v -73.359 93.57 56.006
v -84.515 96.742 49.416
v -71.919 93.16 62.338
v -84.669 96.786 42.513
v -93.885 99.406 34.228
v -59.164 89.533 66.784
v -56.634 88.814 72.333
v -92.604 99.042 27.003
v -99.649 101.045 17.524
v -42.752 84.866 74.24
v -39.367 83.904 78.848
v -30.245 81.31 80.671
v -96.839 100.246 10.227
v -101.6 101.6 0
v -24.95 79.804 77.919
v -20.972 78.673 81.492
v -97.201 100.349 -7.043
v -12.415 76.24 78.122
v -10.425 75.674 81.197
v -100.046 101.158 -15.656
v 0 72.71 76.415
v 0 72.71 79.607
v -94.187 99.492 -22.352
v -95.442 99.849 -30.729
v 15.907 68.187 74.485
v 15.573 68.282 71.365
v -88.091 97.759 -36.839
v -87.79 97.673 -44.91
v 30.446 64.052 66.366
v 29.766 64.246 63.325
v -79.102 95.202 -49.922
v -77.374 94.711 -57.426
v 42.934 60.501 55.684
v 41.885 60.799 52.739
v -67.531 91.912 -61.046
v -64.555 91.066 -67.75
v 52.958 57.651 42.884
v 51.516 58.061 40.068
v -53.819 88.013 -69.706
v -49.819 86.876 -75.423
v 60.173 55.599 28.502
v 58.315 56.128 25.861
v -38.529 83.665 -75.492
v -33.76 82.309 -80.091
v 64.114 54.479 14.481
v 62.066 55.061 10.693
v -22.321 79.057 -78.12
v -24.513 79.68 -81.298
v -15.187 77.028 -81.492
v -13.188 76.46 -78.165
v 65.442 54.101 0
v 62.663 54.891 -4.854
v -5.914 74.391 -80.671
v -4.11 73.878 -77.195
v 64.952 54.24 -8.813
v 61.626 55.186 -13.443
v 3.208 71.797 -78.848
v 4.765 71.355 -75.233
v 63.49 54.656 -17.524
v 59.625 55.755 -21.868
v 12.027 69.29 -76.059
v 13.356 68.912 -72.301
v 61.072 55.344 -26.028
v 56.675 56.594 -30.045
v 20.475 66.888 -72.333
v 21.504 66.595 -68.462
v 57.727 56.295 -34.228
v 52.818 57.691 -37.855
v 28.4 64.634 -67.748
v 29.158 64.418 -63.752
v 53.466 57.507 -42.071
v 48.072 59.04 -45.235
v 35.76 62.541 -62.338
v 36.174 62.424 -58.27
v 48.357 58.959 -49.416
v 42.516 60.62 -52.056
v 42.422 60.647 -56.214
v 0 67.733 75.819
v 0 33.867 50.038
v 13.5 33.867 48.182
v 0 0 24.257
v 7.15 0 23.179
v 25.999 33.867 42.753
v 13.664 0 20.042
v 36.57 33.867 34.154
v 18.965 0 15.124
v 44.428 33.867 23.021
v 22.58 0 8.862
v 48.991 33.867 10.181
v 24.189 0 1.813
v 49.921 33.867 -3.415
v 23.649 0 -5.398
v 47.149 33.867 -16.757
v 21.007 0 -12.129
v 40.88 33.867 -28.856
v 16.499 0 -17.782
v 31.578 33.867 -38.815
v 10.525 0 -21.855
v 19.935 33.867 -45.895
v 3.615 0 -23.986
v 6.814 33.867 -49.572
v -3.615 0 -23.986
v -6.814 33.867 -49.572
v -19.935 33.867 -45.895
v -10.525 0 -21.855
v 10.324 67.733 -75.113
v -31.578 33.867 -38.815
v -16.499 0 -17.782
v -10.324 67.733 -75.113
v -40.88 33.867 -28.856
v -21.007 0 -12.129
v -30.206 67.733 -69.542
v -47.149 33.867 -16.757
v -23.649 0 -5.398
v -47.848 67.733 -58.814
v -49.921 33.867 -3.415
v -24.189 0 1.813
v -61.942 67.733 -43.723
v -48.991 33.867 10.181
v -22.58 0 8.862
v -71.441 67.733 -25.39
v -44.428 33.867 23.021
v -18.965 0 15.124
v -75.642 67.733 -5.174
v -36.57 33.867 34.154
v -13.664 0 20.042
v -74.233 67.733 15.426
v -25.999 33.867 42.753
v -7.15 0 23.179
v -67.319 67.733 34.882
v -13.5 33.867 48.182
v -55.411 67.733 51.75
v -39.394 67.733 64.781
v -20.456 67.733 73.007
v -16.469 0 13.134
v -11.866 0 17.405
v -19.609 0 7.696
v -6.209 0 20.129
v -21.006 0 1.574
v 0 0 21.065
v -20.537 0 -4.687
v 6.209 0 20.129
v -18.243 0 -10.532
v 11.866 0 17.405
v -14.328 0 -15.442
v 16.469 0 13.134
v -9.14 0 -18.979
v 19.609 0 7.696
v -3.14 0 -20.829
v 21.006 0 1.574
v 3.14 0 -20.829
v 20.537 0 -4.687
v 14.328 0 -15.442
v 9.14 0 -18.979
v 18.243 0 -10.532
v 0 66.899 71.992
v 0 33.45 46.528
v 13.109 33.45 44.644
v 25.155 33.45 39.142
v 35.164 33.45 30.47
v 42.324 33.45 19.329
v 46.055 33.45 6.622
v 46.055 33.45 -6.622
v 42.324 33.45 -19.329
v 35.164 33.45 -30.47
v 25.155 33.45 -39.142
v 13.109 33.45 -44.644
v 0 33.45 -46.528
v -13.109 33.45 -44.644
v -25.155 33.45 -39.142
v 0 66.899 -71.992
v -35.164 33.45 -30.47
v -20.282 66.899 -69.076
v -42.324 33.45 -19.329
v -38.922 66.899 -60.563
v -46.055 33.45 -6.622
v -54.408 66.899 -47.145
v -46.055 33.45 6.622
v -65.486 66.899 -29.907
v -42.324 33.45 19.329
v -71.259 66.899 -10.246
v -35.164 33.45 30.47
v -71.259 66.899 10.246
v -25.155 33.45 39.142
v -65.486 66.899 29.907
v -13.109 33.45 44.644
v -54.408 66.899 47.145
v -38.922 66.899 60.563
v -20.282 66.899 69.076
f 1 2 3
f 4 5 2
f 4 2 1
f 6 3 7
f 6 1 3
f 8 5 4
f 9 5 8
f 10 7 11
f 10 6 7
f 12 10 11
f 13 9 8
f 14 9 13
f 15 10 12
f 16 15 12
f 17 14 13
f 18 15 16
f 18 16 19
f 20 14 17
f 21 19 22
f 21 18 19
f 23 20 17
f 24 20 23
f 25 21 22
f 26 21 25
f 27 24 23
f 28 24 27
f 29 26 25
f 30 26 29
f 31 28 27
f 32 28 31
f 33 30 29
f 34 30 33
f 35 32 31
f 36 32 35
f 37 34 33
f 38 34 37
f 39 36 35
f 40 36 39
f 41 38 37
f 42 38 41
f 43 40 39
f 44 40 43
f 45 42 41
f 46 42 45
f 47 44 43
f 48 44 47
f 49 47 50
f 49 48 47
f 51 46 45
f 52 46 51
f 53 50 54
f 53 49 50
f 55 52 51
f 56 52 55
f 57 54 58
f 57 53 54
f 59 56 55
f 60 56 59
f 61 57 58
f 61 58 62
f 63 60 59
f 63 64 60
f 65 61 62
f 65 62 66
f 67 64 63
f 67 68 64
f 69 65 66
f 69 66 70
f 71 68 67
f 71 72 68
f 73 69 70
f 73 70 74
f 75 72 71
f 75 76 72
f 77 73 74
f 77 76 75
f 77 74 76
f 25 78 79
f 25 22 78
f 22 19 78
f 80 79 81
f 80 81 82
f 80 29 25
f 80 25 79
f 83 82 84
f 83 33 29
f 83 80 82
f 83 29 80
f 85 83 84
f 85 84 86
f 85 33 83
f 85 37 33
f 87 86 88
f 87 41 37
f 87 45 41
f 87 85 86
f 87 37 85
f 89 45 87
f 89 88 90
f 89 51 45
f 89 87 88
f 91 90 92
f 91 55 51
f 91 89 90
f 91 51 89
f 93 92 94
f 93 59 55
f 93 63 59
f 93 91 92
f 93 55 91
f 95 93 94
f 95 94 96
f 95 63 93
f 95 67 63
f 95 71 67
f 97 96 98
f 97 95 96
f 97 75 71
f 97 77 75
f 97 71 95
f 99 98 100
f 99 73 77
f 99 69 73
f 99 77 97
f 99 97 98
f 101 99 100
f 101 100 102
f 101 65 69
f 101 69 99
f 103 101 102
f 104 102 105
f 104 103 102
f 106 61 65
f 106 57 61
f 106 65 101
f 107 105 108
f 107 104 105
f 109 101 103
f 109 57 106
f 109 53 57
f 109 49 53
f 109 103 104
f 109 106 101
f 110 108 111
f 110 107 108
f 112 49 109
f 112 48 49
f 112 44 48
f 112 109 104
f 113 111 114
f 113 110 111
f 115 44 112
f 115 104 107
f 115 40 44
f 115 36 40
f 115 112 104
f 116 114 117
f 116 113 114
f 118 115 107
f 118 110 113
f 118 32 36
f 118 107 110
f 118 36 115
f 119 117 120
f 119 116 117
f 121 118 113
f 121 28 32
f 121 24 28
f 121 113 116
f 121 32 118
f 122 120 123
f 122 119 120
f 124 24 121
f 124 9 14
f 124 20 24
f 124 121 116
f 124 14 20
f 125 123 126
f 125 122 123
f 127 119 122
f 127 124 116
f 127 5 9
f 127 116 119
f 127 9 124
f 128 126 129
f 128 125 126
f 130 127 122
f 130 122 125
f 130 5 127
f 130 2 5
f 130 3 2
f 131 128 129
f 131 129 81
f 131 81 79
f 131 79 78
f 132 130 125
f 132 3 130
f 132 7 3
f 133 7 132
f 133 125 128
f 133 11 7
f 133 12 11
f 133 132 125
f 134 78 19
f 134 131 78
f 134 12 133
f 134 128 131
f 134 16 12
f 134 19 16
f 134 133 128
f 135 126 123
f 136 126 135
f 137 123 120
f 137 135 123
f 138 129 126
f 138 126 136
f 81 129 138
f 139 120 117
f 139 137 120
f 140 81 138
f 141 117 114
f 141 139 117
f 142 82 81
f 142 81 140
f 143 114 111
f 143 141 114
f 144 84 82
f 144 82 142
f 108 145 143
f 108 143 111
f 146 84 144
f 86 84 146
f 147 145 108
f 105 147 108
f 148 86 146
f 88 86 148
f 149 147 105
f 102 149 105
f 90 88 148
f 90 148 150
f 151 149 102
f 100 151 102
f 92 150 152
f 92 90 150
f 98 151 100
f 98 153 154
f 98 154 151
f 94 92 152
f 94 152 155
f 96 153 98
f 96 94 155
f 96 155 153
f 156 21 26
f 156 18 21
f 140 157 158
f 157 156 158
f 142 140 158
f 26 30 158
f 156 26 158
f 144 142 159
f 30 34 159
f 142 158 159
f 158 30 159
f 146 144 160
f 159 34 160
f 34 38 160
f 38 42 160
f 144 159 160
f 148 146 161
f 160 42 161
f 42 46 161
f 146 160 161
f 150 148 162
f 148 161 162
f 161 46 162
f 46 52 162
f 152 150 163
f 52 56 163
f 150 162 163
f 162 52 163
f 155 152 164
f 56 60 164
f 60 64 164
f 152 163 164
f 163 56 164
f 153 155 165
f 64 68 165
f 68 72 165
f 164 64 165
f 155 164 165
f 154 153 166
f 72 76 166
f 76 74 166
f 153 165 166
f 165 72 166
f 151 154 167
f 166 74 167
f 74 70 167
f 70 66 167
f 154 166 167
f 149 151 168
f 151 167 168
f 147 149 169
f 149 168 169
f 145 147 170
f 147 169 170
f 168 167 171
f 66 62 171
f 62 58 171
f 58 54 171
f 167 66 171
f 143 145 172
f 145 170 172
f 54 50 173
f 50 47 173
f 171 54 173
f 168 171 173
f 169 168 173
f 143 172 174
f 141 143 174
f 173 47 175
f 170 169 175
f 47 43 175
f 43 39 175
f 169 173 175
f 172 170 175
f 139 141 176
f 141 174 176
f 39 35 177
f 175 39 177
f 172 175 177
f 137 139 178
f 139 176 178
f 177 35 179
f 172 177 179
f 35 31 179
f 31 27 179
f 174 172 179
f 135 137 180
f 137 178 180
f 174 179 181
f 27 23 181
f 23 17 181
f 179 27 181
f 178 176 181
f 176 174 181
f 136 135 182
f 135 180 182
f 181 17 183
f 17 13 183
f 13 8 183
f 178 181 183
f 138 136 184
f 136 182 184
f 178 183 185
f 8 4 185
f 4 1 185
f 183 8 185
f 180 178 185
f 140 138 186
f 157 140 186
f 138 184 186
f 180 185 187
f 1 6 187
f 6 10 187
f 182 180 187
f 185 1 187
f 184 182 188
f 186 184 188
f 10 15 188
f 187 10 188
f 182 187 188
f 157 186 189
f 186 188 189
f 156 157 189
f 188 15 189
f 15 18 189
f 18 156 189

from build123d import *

# Parameters (mm, degrees)
SHELL1_T                = -2.54
CUT_EXTRUDE4_DEPTH      = 176.976362049
CUT_EXTRUDE4_DEPTH_BACK = 176.976362049


with BuildPart() as part:
    # Sketch3 → Revolve1 (revolve)
    with BuildSketch(Plane.XY, mode=Mode.PRIVATE) as revolve1_sk:
        Polygon((0, 0), (-24.257, 0), (-101.6, 101.6), (0, 101.6), align=None)
    revolve(revolve1_sk.sketch.rotate(Axis((0, 0, 0), (0, 1, 0)), 90), axis=Axis((0, 0, 0), (0, 1, 0)))

    # Shell1
    shell1_openings = [part.faces().sort_by_distance(p)[0] for p in [
        (0, 101.6, 0),
        (0, 0, 0),
    ]]
    offset(amount=SHELL1_T, openings=shell1_openings, kind=Kind.INTERSECTION)

    # Sketch4 → Cut-Extrude4 (cut, two sides: drawn at the far end of the back side and taken through both)
    with BuildSketch(Plane.XY.offset(-CUT_EXTRUDE4_DEPTH_BACK)):
        Polygon((101.6, 101.6), (0, 101.6), (-101.6, 101.6), (65.441557357, 54.101224771), align=None)
    extrude(amount=CUT_EXTRUDE4_DEPTH + CUT_EXTRUDE4_DEPTH_BACK, mode=Mode.SUBTRACT)


solid = part.part
